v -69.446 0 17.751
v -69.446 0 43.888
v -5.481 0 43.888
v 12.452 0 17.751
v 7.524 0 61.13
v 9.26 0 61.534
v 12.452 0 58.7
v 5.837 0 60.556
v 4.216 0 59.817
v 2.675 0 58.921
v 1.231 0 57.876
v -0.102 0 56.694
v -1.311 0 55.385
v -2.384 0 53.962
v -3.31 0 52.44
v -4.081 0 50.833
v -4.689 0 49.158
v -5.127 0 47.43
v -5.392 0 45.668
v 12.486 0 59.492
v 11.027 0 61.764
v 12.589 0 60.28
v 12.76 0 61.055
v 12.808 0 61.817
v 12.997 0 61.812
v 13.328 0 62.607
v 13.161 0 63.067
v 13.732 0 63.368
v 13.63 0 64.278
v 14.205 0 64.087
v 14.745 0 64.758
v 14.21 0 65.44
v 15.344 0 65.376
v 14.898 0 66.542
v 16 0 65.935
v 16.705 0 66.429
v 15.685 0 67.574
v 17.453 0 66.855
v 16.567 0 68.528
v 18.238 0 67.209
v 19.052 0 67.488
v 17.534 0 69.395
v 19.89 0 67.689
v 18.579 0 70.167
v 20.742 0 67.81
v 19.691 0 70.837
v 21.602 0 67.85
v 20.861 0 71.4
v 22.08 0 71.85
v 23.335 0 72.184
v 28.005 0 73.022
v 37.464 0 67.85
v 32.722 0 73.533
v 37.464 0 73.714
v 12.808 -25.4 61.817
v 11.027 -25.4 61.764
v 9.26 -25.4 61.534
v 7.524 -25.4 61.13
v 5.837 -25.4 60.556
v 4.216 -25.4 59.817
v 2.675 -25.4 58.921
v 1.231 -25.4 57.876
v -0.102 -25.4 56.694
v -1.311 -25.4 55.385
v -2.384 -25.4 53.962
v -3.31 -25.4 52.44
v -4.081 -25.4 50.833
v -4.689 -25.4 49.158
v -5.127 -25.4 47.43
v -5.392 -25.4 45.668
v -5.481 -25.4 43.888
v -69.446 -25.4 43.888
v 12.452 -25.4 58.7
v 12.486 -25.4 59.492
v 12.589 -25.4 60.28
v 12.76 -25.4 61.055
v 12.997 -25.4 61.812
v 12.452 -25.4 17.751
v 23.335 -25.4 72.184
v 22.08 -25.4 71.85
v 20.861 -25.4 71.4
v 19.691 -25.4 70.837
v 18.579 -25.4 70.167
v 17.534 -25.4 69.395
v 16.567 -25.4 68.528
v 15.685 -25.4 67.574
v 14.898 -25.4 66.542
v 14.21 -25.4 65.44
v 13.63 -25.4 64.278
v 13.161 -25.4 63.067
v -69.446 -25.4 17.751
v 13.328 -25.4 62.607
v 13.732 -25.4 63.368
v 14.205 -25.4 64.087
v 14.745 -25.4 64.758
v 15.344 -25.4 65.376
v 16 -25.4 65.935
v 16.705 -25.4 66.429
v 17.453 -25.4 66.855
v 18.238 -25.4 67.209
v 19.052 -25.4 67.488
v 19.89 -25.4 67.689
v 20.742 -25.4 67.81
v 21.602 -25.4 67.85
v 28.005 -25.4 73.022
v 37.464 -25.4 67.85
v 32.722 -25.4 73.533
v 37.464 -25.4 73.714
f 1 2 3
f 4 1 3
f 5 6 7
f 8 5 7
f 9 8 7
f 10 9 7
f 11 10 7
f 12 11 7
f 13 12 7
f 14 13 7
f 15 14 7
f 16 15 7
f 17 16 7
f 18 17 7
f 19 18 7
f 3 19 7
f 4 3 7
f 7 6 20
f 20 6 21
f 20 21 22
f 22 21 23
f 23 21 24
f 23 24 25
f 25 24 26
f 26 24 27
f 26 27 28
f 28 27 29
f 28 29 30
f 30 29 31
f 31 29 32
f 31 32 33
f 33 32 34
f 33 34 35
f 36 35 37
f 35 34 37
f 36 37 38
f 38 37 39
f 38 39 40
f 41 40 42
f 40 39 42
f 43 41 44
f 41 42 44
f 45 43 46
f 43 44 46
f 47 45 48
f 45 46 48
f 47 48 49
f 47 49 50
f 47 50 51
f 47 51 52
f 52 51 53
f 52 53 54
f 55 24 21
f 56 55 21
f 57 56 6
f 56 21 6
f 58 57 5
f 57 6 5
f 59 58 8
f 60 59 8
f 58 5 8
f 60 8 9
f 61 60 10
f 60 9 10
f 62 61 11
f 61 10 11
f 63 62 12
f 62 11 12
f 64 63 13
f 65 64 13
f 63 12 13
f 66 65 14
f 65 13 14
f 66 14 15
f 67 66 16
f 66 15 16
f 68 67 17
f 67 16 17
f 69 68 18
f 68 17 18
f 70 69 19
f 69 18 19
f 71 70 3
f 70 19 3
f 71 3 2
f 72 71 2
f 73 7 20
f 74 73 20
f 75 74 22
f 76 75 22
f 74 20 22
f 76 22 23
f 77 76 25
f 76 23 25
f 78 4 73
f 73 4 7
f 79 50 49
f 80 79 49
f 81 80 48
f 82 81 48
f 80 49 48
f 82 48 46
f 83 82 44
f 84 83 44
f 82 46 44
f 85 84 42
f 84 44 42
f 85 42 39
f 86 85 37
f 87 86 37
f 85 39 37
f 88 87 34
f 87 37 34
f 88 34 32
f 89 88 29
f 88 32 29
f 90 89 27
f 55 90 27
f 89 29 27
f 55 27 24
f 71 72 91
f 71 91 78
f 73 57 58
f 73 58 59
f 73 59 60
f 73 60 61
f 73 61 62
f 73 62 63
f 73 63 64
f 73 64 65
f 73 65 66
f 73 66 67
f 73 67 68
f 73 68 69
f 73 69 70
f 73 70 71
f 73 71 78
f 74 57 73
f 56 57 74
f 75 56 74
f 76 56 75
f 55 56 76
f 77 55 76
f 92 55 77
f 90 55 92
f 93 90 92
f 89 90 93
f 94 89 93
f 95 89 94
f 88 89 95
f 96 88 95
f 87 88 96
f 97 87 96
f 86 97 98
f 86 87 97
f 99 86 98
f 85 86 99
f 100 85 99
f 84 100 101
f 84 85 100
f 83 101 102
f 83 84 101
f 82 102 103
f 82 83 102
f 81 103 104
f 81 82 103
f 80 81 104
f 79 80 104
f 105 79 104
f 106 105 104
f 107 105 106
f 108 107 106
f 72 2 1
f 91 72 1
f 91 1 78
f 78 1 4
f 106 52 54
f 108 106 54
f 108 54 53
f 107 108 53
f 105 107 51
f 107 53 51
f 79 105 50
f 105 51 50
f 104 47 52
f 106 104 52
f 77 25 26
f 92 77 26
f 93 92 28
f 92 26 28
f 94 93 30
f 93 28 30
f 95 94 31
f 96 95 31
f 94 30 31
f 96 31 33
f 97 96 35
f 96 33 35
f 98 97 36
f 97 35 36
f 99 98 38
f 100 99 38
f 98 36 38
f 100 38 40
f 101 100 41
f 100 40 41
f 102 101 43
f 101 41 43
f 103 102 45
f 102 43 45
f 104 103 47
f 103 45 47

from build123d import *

# Parameters (mm, degrees)
F1_DEPTH = 25.4


with BuildPart() as f1:
    # F0 (on Front) → F1 (new body)
    with BuildSketch(Plane.XZ):
        Polygon((-5.4805049415, 43.8882187009), (-69.4460719824, 43.8882187009), (-69.4460719824, 17.7506506443), (12.4516431242, 17.7506506443), (12.4516431242, 43.8882187009), align=None)
        with BuildLine():
            ThreePointArc((12.8084794992, 61.8168160262), (-0.1015057146, 56.6937014517), (-5.4805049415, 43.8882187009))
            Line((-5.4805049415, 43.8882187009), (12.4516431242, 43.8882187009))
            Line((12.4516431242, 43.8882187009), (12.4516431242, 58.6995072663))
            ThreePointArc((12.4516431242, 58.6995072663), (12.5411425509, 60.2683401209), (12.8084794992, 61.8168160262))
        make_face()
        with BuildLine():
            ThreePointArc((23.3348449459, 72.183508426), (16.5668649609, 68.5281371373), (12.8084794992, 61.8168160262))
            ThreePointArc((12.8084794992, 61.8168160262), (12.9028776825, 61.8146885604), (12.9972633549, 61.81206407))
            ThreePointArc((12.9972633549, 61.81206407), (16.3462648739, 66.1901444716), (21.6024321989, 67.8502963409))
            Line((21.6024321989, 67.8502963409), (37.4638475478, 67.8502963409))
            Line((37.4638475478, 67.8502963409), (37.4638475478, 73.7137471339))
            ThreePointArc((37.4638475478, 73.7137471339), (30.3592257705, 73.3190682295), (23.3348449459, 72.183508426))
        make_face()
        with BuildLine():
            ThreePointArc((12.9972633549, 61.81206407), (12.9028776825, 61.8146885604), (12.8084794992, 61.8168160262))
            ThreePointArc((12.8084794992, 61.8168160262), (12.5411425509, 60.2683401209), (12.4516431242, 58.6995072663))
            ThreePointArc((12.4516431242, 58.6995072663), (12.5890802771, 60.279516071), (12.9972633549, 61.81206407))
        make_face()
    extrude(amount=F1_DEPTH)


solid = f1.part
